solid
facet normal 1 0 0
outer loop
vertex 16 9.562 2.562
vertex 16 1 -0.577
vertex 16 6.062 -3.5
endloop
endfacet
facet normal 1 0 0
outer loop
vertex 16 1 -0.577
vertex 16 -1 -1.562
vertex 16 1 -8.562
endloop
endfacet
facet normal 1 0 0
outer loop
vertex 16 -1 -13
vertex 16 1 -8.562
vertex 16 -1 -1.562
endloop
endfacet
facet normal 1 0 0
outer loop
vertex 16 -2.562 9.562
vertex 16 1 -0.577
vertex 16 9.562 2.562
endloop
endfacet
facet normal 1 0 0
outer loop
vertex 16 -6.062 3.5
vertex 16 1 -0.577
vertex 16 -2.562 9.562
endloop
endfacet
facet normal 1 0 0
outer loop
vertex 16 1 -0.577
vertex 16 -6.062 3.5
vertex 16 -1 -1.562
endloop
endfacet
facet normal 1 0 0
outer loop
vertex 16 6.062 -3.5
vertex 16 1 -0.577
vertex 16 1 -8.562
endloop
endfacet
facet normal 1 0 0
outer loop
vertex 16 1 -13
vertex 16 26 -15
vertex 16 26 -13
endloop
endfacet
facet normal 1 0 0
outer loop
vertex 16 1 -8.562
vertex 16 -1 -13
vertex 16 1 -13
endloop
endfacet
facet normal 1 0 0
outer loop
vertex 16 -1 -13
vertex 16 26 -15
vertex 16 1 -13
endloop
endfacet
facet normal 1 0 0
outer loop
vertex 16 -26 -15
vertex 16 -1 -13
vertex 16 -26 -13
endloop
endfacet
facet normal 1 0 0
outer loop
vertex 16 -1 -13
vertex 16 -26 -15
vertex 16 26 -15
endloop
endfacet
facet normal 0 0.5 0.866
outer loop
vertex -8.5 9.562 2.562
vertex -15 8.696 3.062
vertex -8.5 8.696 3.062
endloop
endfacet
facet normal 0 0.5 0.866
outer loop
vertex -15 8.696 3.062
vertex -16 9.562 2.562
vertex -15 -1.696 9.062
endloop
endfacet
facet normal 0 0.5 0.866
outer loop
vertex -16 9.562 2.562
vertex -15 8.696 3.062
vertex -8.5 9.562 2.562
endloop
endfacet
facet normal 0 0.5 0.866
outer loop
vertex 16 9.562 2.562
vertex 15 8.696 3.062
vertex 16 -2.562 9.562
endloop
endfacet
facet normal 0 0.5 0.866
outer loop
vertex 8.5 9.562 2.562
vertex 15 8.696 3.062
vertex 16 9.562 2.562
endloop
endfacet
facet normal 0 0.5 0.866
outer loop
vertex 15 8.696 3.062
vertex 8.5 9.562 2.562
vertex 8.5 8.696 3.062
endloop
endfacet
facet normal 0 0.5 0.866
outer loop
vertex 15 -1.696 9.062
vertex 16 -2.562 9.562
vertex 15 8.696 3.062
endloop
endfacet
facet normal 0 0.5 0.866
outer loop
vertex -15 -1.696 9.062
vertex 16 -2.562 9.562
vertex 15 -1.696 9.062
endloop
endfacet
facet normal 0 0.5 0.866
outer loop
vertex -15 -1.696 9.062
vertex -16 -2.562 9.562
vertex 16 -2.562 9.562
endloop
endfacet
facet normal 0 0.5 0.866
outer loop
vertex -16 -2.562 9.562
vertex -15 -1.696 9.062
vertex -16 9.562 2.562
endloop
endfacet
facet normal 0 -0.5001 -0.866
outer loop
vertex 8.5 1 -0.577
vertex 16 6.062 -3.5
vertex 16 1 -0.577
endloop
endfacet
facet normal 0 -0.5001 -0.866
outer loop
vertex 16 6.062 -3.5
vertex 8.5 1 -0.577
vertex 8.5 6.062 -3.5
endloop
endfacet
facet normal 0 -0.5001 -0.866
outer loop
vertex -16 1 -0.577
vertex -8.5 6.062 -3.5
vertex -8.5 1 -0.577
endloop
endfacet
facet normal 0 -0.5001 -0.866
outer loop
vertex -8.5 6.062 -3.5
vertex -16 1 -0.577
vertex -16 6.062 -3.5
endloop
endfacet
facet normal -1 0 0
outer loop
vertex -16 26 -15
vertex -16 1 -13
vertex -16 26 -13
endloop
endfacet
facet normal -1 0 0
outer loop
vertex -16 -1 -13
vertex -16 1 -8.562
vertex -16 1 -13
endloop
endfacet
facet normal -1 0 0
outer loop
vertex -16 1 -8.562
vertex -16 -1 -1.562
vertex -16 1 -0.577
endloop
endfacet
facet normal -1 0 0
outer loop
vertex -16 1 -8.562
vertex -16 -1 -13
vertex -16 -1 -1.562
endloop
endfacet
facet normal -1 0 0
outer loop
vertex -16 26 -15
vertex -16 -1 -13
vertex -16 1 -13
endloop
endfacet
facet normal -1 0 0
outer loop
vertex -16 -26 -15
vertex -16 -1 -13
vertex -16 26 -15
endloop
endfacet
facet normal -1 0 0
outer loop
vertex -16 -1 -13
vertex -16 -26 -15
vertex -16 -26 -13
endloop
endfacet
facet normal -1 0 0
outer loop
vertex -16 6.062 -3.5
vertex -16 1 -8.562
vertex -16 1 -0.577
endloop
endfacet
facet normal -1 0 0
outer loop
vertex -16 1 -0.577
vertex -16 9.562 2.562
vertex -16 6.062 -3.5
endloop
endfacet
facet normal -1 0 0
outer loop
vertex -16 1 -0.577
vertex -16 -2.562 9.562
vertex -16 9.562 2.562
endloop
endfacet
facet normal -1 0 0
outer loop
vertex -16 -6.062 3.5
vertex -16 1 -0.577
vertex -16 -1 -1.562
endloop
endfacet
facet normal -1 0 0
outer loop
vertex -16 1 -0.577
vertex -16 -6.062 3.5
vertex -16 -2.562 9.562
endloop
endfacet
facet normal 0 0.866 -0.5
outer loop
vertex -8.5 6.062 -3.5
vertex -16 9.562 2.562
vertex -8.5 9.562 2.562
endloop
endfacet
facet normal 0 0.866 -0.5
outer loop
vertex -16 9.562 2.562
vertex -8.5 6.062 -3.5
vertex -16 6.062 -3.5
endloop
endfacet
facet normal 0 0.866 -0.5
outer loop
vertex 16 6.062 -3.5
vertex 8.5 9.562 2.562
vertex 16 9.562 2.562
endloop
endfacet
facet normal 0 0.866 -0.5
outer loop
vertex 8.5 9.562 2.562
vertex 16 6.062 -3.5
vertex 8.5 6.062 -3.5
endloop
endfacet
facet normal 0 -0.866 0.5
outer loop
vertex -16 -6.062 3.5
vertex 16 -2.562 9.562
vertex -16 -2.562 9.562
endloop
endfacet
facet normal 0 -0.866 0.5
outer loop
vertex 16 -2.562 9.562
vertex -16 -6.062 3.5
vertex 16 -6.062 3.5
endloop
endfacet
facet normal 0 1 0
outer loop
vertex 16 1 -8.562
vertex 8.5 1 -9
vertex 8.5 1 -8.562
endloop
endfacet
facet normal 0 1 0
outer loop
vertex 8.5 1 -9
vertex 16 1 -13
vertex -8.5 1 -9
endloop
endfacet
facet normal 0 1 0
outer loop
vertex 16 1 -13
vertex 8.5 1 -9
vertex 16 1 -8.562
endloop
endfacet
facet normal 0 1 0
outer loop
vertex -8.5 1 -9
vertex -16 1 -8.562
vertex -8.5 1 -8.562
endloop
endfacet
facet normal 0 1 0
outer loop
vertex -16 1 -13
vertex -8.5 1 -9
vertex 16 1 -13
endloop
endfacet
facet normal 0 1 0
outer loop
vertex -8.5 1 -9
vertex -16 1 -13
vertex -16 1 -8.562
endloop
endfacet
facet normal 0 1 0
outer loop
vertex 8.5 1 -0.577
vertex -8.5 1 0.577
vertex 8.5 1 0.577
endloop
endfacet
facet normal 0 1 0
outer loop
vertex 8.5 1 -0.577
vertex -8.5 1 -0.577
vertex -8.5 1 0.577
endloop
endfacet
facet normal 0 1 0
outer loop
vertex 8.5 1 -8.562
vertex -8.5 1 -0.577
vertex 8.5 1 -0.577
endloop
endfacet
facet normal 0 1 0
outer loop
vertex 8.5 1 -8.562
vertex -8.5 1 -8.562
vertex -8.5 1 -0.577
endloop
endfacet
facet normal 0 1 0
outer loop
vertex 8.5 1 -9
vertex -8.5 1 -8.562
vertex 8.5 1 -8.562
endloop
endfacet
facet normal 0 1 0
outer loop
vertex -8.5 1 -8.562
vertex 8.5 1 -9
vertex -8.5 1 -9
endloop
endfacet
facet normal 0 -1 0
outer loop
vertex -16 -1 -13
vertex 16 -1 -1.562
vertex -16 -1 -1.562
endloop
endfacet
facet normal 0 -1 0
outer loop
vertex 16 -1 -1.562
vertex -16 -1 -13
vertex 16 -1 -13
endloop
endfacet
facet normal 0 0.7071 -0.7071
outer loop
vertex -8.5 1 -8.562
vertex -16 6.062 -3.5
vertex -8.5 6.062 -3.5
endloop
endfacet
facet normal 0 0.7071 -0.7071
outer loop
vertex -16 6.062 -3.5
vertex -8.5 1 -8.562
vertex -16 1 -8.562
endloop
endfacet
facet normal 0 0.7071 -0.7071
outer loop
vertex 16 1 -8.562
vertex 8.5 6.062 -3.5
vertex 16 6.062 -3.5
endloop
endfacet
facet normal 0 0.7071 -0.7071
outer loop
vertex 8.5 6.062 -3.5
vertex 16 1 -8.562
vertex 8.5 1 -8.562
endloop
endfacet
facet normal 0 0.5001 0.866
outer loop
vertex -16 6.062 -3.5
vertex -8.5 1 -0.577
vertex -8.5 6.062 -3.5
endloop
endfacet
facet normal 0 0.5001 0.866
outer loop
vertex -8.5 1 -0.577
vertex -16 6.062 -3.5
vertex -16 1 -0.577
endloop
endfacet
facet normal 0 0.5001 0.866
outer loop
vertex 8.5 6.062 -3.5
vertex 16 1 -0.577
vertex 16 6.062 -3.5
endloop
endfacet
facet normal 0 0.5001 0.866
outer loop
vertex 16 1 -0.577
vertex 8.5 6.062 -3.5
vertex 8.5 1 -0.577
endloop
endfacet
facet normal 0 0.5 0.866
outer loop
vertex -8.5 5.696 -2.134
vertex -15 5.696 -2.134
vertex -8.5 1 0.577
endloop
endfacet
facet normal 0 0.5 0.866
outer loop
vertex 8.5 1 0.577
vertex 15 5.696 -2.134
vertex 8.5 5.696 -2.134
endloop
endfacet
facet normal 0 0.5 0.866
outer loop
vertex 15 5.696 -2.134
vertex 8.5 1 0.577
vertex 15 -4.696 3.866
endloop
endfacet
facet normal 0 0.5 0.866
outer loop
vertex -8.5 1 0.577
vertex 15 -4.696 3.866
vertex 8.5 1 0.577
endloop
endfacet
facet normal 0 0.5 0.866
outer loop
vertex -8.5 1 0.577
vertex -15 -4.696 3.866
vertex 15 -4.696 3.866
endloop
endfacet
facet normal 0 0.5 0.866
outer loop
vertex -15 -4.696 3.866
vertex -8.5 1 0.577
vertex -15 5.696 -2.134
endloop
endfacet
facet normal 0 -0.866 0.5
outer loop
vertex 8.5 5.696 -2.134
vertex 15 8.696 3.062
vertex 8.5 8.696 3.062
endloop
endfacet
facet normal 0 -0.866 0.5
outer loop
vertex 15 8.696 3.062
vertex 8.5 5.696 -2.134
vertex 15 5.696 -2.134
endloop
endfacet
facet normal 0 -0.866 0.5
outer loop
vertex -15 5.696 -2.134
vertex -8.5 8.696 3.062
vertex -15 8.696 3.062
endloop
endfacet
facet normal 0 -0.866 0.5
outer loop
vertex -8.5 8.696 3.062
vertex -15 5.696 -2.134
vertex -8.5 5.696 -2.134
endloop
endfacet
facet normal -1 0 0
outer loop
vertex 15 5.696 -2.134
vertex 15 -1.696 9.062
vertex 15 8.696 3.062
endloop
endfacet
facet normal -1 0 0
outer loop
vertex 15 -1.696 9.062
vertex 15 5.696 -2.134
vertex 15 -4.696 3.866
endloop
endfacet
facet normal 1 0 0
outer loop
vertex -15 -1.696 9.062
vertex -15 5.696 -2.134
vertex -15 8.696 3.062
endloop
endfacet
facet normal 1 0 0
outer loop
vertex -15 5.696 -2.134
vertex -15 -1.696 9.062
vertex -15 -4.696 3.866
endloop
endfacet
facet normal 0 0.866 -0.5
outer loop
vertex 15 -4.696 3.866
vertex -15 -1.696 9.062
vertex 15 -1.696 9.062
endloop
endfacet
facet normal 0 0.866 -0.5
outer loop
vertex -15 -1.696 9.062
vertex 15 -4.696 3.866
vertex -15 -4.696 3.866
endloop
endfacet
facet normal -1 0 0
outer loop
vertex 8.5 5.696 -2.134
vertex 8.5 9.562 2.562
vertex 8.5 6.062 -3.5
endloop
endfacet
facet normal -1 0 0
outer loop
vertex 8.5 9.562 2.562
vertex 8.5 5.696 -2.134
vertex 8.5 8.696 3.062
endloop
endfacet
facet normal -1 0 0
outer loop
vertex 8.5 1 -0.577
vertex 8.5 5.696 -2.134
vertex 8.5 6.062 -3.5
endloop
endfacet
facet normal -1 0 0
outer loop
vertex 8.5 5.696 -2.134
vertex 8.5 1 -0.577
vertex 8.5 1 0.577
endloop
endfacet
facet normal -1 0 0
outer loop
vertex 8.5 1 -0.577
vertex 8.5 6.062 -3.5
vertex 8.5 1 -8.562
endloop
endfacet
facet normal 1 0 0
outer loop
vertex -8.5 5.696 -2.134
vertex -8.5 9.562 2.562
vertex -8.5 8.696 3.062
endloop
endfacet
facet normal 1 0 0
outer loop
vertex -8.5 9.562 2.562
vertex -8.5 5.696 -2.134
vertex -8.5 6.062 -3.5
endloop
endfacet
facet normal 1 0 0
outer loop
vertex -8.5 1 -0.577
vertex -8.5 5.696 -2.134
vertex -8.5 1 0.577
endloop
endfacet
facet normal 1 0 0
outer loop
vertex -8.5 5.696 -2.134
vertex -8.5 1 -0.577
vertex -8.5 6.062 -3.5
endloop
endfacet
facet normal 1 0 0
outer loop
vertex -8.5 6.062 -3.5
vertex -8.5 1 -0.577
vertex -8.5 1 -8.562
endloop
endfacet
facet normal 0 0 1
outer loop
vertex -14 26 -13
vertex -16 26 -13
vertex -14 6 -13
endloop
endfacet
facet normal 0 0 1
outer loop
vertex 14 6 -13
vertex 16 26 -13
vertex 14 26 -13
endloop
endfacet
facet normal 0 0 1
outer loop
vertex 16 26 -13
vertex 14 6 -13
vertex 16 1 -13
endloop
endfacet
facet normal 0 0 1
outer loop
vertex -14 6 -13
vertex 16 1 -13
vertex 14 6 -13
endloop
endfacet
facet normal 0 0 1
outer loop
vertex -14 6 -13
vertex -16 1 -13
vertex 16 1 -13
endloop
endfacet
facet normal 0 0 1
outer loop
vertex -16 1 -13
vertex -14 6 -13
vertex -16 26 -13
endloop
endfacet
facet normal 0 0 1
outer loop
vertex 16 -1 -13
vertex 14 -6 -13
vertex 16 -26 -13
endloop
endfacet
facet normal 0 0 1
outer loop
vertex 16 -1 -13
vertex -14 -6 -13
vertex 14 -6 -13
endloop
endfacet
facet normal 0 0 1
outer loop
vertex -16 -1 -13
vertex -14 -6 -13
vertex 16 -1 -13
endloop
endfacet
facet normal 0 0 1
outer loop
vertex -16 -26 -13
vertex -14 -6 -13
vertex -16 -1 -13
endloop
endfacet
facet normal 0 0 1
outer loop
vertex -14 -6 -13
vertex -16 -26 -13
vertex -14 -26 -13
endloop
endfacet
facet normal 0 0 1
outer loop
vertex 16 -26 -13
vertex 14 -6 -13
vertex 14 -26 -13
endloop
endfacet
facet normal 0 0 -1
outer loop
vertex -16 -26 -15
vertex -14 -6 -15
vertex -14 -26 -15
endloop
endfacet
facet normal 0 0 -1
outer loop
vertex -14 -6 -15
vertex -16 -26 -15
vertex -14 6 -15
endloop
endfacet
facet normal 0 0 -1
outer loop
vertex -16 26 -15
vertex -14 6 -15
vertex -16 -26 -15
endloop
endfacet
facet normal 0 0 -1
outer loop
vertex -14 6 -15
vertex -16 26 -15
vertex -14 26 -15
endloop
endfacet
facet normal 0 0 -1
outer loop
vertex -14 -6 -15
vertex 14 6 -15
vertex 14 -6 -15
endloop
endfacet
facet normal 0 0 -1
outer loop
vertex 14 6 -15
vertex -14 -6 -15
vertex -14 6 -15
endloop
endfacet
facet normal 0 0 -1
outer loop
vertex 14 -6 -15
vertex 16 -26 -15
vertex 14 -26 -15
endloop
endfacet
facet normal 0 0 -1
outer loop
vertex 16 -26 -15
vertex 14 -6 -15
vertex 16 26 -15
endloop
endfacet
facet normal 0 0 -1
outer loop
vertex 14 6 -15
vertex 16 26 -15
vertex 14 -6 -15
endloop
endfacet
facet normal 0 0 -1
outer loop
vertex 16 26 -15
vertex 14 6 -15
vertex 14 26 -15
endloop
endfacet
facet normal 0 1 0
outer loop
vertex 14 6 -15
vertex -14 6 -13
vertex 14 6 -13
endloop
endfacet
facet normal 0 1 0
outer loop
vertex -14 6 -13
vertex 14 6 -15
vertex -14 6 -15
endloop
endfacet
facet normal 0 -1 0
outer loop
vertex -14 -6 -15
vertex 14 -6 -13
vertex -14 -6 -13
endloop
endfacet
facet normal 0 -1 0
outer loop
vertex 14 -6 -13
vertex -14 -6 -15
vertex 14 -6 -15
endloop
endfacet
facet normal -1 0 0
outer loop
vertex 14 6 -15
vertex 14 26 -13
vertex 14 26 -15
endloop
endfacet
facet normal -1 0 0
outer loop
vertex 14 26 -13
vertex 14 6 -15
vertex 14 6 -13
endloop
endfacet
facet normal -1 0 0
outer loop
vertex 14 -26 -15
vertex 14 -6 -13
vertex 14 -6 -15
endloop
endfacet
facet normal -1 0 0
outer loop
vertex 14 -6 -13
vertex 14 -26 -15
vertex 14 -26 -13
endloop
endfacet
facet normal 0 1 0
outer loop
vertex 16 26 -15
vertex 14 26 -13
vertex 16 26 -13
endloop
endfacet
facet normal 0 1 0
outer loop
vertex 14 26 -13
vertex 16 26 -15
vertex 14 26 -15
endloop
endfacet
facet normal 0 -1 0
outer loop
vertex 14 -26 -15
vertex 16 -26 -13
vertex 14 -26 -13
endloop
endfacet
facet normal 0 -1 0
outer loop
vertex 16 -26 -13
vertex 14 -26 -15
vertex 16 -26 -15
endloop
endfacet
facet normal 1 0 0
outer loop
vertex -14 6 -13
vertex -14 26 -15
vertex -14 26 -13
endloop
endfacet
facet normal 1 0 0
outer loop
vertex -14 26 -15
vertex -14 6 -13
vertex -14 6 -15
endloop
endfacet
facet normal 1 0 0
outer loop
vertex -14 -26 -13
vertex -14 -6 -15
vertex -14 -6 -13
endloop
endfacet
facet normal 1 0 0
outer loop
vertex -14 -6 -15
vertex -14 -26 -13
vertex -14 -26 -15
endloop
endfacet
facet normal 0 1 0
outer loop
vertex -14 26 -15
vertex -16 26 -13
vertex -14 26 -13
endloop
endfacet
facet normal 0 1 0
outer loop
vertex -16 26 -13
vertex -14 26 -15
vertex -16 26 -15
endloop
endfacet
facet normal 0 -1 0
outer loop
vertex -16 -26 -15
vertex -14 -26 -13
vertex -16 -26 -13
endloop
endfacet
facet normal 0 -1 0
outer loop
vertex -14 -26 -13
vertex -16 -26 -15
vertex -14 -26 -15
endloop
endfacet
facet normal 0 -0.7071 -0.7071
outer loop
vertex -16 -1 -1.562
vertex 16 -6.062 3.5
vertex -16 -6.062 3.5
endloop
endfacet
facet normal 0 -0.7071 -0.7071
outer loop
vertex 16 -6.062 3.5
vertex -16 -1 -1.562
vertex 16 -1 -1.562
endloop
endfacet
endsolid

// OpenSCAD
// [FL_INDEX: keywords="openscad, 3d_parametric, Raspberry_Pi_Camera_Case_Stand_with_customizable_fixed_angle, csg_solid" | COT="Parametric OpenSCAD design from 3DCodeverse"]
// Title: Raspberry Pi Camera Case Stand with customizable fixed angle

// This is designed to support the case from http://www.thingiverse.com/thing:92208
// The angle of the support should always be 45 degrees so that it can be printed without
//   support.

/* [Global] */
// Positive angles point camera case down, negative point up
angle=-30; // [-45:45]

difference() {

union() {
// Holder
rotate([angle,0,0])
translate([0,0,3.5]) cube([30+2,12+2,7],center=true);
// Up/Down part
translate([0,0,-5]) cube([30+2,2,18],center=true);

color("red")
translate([0,0,0]) translate([0,0,0]) rotate([0,90,0]) linear_extrude(height = 32, center = true, convexity = 10, twist = 0)
polygon(  points=[[0,0],[7*cos(angle)-7*sin(angle),0],[7*sin(-angle),7*cos(angle)]], paths=[[0,1,2]]);
}


// Cut-out for the camera and the ribbon cable
color("green")
union() {
rotate([angle,0,0]) translate([0,0,1])translate([0,0,15]) cube([30,12,30],center=true);

if(angle>0) {
rotate([angle,0,0]) translate([0,7,14]) cube([17,12,30],center=true);
} else {
rotate([angle,0,0]) translate([0,7,16]) cube([17,12,30],center=true);
}
translate([0,0,1]) translate([0,7,5]) cube([17,12,30],center=true);

}

}

// Base
translate([0,0,-14]) cube([30,12,2],center=true);
// Legs
translate([(2+30)/2-1,0,-14]) cube([2,2+50,2],center=true);
translate([-(2+30)/2+1,0,-14]) cube([2,2+50,2],center=true);


rotate([0,0,180])
color("blue")
translate([0,0,0]) translate([0,0,0]) rotate([0,90,0]) linear_extrude(height = 32, center = true, convexity = 10, twist = 0)
polygon(  points=[[0,0],[7*cos(angle)+7*sin(angle),0],[7*sin(angle),7*cos(angle)]], paths=[[0,1,2]]);
